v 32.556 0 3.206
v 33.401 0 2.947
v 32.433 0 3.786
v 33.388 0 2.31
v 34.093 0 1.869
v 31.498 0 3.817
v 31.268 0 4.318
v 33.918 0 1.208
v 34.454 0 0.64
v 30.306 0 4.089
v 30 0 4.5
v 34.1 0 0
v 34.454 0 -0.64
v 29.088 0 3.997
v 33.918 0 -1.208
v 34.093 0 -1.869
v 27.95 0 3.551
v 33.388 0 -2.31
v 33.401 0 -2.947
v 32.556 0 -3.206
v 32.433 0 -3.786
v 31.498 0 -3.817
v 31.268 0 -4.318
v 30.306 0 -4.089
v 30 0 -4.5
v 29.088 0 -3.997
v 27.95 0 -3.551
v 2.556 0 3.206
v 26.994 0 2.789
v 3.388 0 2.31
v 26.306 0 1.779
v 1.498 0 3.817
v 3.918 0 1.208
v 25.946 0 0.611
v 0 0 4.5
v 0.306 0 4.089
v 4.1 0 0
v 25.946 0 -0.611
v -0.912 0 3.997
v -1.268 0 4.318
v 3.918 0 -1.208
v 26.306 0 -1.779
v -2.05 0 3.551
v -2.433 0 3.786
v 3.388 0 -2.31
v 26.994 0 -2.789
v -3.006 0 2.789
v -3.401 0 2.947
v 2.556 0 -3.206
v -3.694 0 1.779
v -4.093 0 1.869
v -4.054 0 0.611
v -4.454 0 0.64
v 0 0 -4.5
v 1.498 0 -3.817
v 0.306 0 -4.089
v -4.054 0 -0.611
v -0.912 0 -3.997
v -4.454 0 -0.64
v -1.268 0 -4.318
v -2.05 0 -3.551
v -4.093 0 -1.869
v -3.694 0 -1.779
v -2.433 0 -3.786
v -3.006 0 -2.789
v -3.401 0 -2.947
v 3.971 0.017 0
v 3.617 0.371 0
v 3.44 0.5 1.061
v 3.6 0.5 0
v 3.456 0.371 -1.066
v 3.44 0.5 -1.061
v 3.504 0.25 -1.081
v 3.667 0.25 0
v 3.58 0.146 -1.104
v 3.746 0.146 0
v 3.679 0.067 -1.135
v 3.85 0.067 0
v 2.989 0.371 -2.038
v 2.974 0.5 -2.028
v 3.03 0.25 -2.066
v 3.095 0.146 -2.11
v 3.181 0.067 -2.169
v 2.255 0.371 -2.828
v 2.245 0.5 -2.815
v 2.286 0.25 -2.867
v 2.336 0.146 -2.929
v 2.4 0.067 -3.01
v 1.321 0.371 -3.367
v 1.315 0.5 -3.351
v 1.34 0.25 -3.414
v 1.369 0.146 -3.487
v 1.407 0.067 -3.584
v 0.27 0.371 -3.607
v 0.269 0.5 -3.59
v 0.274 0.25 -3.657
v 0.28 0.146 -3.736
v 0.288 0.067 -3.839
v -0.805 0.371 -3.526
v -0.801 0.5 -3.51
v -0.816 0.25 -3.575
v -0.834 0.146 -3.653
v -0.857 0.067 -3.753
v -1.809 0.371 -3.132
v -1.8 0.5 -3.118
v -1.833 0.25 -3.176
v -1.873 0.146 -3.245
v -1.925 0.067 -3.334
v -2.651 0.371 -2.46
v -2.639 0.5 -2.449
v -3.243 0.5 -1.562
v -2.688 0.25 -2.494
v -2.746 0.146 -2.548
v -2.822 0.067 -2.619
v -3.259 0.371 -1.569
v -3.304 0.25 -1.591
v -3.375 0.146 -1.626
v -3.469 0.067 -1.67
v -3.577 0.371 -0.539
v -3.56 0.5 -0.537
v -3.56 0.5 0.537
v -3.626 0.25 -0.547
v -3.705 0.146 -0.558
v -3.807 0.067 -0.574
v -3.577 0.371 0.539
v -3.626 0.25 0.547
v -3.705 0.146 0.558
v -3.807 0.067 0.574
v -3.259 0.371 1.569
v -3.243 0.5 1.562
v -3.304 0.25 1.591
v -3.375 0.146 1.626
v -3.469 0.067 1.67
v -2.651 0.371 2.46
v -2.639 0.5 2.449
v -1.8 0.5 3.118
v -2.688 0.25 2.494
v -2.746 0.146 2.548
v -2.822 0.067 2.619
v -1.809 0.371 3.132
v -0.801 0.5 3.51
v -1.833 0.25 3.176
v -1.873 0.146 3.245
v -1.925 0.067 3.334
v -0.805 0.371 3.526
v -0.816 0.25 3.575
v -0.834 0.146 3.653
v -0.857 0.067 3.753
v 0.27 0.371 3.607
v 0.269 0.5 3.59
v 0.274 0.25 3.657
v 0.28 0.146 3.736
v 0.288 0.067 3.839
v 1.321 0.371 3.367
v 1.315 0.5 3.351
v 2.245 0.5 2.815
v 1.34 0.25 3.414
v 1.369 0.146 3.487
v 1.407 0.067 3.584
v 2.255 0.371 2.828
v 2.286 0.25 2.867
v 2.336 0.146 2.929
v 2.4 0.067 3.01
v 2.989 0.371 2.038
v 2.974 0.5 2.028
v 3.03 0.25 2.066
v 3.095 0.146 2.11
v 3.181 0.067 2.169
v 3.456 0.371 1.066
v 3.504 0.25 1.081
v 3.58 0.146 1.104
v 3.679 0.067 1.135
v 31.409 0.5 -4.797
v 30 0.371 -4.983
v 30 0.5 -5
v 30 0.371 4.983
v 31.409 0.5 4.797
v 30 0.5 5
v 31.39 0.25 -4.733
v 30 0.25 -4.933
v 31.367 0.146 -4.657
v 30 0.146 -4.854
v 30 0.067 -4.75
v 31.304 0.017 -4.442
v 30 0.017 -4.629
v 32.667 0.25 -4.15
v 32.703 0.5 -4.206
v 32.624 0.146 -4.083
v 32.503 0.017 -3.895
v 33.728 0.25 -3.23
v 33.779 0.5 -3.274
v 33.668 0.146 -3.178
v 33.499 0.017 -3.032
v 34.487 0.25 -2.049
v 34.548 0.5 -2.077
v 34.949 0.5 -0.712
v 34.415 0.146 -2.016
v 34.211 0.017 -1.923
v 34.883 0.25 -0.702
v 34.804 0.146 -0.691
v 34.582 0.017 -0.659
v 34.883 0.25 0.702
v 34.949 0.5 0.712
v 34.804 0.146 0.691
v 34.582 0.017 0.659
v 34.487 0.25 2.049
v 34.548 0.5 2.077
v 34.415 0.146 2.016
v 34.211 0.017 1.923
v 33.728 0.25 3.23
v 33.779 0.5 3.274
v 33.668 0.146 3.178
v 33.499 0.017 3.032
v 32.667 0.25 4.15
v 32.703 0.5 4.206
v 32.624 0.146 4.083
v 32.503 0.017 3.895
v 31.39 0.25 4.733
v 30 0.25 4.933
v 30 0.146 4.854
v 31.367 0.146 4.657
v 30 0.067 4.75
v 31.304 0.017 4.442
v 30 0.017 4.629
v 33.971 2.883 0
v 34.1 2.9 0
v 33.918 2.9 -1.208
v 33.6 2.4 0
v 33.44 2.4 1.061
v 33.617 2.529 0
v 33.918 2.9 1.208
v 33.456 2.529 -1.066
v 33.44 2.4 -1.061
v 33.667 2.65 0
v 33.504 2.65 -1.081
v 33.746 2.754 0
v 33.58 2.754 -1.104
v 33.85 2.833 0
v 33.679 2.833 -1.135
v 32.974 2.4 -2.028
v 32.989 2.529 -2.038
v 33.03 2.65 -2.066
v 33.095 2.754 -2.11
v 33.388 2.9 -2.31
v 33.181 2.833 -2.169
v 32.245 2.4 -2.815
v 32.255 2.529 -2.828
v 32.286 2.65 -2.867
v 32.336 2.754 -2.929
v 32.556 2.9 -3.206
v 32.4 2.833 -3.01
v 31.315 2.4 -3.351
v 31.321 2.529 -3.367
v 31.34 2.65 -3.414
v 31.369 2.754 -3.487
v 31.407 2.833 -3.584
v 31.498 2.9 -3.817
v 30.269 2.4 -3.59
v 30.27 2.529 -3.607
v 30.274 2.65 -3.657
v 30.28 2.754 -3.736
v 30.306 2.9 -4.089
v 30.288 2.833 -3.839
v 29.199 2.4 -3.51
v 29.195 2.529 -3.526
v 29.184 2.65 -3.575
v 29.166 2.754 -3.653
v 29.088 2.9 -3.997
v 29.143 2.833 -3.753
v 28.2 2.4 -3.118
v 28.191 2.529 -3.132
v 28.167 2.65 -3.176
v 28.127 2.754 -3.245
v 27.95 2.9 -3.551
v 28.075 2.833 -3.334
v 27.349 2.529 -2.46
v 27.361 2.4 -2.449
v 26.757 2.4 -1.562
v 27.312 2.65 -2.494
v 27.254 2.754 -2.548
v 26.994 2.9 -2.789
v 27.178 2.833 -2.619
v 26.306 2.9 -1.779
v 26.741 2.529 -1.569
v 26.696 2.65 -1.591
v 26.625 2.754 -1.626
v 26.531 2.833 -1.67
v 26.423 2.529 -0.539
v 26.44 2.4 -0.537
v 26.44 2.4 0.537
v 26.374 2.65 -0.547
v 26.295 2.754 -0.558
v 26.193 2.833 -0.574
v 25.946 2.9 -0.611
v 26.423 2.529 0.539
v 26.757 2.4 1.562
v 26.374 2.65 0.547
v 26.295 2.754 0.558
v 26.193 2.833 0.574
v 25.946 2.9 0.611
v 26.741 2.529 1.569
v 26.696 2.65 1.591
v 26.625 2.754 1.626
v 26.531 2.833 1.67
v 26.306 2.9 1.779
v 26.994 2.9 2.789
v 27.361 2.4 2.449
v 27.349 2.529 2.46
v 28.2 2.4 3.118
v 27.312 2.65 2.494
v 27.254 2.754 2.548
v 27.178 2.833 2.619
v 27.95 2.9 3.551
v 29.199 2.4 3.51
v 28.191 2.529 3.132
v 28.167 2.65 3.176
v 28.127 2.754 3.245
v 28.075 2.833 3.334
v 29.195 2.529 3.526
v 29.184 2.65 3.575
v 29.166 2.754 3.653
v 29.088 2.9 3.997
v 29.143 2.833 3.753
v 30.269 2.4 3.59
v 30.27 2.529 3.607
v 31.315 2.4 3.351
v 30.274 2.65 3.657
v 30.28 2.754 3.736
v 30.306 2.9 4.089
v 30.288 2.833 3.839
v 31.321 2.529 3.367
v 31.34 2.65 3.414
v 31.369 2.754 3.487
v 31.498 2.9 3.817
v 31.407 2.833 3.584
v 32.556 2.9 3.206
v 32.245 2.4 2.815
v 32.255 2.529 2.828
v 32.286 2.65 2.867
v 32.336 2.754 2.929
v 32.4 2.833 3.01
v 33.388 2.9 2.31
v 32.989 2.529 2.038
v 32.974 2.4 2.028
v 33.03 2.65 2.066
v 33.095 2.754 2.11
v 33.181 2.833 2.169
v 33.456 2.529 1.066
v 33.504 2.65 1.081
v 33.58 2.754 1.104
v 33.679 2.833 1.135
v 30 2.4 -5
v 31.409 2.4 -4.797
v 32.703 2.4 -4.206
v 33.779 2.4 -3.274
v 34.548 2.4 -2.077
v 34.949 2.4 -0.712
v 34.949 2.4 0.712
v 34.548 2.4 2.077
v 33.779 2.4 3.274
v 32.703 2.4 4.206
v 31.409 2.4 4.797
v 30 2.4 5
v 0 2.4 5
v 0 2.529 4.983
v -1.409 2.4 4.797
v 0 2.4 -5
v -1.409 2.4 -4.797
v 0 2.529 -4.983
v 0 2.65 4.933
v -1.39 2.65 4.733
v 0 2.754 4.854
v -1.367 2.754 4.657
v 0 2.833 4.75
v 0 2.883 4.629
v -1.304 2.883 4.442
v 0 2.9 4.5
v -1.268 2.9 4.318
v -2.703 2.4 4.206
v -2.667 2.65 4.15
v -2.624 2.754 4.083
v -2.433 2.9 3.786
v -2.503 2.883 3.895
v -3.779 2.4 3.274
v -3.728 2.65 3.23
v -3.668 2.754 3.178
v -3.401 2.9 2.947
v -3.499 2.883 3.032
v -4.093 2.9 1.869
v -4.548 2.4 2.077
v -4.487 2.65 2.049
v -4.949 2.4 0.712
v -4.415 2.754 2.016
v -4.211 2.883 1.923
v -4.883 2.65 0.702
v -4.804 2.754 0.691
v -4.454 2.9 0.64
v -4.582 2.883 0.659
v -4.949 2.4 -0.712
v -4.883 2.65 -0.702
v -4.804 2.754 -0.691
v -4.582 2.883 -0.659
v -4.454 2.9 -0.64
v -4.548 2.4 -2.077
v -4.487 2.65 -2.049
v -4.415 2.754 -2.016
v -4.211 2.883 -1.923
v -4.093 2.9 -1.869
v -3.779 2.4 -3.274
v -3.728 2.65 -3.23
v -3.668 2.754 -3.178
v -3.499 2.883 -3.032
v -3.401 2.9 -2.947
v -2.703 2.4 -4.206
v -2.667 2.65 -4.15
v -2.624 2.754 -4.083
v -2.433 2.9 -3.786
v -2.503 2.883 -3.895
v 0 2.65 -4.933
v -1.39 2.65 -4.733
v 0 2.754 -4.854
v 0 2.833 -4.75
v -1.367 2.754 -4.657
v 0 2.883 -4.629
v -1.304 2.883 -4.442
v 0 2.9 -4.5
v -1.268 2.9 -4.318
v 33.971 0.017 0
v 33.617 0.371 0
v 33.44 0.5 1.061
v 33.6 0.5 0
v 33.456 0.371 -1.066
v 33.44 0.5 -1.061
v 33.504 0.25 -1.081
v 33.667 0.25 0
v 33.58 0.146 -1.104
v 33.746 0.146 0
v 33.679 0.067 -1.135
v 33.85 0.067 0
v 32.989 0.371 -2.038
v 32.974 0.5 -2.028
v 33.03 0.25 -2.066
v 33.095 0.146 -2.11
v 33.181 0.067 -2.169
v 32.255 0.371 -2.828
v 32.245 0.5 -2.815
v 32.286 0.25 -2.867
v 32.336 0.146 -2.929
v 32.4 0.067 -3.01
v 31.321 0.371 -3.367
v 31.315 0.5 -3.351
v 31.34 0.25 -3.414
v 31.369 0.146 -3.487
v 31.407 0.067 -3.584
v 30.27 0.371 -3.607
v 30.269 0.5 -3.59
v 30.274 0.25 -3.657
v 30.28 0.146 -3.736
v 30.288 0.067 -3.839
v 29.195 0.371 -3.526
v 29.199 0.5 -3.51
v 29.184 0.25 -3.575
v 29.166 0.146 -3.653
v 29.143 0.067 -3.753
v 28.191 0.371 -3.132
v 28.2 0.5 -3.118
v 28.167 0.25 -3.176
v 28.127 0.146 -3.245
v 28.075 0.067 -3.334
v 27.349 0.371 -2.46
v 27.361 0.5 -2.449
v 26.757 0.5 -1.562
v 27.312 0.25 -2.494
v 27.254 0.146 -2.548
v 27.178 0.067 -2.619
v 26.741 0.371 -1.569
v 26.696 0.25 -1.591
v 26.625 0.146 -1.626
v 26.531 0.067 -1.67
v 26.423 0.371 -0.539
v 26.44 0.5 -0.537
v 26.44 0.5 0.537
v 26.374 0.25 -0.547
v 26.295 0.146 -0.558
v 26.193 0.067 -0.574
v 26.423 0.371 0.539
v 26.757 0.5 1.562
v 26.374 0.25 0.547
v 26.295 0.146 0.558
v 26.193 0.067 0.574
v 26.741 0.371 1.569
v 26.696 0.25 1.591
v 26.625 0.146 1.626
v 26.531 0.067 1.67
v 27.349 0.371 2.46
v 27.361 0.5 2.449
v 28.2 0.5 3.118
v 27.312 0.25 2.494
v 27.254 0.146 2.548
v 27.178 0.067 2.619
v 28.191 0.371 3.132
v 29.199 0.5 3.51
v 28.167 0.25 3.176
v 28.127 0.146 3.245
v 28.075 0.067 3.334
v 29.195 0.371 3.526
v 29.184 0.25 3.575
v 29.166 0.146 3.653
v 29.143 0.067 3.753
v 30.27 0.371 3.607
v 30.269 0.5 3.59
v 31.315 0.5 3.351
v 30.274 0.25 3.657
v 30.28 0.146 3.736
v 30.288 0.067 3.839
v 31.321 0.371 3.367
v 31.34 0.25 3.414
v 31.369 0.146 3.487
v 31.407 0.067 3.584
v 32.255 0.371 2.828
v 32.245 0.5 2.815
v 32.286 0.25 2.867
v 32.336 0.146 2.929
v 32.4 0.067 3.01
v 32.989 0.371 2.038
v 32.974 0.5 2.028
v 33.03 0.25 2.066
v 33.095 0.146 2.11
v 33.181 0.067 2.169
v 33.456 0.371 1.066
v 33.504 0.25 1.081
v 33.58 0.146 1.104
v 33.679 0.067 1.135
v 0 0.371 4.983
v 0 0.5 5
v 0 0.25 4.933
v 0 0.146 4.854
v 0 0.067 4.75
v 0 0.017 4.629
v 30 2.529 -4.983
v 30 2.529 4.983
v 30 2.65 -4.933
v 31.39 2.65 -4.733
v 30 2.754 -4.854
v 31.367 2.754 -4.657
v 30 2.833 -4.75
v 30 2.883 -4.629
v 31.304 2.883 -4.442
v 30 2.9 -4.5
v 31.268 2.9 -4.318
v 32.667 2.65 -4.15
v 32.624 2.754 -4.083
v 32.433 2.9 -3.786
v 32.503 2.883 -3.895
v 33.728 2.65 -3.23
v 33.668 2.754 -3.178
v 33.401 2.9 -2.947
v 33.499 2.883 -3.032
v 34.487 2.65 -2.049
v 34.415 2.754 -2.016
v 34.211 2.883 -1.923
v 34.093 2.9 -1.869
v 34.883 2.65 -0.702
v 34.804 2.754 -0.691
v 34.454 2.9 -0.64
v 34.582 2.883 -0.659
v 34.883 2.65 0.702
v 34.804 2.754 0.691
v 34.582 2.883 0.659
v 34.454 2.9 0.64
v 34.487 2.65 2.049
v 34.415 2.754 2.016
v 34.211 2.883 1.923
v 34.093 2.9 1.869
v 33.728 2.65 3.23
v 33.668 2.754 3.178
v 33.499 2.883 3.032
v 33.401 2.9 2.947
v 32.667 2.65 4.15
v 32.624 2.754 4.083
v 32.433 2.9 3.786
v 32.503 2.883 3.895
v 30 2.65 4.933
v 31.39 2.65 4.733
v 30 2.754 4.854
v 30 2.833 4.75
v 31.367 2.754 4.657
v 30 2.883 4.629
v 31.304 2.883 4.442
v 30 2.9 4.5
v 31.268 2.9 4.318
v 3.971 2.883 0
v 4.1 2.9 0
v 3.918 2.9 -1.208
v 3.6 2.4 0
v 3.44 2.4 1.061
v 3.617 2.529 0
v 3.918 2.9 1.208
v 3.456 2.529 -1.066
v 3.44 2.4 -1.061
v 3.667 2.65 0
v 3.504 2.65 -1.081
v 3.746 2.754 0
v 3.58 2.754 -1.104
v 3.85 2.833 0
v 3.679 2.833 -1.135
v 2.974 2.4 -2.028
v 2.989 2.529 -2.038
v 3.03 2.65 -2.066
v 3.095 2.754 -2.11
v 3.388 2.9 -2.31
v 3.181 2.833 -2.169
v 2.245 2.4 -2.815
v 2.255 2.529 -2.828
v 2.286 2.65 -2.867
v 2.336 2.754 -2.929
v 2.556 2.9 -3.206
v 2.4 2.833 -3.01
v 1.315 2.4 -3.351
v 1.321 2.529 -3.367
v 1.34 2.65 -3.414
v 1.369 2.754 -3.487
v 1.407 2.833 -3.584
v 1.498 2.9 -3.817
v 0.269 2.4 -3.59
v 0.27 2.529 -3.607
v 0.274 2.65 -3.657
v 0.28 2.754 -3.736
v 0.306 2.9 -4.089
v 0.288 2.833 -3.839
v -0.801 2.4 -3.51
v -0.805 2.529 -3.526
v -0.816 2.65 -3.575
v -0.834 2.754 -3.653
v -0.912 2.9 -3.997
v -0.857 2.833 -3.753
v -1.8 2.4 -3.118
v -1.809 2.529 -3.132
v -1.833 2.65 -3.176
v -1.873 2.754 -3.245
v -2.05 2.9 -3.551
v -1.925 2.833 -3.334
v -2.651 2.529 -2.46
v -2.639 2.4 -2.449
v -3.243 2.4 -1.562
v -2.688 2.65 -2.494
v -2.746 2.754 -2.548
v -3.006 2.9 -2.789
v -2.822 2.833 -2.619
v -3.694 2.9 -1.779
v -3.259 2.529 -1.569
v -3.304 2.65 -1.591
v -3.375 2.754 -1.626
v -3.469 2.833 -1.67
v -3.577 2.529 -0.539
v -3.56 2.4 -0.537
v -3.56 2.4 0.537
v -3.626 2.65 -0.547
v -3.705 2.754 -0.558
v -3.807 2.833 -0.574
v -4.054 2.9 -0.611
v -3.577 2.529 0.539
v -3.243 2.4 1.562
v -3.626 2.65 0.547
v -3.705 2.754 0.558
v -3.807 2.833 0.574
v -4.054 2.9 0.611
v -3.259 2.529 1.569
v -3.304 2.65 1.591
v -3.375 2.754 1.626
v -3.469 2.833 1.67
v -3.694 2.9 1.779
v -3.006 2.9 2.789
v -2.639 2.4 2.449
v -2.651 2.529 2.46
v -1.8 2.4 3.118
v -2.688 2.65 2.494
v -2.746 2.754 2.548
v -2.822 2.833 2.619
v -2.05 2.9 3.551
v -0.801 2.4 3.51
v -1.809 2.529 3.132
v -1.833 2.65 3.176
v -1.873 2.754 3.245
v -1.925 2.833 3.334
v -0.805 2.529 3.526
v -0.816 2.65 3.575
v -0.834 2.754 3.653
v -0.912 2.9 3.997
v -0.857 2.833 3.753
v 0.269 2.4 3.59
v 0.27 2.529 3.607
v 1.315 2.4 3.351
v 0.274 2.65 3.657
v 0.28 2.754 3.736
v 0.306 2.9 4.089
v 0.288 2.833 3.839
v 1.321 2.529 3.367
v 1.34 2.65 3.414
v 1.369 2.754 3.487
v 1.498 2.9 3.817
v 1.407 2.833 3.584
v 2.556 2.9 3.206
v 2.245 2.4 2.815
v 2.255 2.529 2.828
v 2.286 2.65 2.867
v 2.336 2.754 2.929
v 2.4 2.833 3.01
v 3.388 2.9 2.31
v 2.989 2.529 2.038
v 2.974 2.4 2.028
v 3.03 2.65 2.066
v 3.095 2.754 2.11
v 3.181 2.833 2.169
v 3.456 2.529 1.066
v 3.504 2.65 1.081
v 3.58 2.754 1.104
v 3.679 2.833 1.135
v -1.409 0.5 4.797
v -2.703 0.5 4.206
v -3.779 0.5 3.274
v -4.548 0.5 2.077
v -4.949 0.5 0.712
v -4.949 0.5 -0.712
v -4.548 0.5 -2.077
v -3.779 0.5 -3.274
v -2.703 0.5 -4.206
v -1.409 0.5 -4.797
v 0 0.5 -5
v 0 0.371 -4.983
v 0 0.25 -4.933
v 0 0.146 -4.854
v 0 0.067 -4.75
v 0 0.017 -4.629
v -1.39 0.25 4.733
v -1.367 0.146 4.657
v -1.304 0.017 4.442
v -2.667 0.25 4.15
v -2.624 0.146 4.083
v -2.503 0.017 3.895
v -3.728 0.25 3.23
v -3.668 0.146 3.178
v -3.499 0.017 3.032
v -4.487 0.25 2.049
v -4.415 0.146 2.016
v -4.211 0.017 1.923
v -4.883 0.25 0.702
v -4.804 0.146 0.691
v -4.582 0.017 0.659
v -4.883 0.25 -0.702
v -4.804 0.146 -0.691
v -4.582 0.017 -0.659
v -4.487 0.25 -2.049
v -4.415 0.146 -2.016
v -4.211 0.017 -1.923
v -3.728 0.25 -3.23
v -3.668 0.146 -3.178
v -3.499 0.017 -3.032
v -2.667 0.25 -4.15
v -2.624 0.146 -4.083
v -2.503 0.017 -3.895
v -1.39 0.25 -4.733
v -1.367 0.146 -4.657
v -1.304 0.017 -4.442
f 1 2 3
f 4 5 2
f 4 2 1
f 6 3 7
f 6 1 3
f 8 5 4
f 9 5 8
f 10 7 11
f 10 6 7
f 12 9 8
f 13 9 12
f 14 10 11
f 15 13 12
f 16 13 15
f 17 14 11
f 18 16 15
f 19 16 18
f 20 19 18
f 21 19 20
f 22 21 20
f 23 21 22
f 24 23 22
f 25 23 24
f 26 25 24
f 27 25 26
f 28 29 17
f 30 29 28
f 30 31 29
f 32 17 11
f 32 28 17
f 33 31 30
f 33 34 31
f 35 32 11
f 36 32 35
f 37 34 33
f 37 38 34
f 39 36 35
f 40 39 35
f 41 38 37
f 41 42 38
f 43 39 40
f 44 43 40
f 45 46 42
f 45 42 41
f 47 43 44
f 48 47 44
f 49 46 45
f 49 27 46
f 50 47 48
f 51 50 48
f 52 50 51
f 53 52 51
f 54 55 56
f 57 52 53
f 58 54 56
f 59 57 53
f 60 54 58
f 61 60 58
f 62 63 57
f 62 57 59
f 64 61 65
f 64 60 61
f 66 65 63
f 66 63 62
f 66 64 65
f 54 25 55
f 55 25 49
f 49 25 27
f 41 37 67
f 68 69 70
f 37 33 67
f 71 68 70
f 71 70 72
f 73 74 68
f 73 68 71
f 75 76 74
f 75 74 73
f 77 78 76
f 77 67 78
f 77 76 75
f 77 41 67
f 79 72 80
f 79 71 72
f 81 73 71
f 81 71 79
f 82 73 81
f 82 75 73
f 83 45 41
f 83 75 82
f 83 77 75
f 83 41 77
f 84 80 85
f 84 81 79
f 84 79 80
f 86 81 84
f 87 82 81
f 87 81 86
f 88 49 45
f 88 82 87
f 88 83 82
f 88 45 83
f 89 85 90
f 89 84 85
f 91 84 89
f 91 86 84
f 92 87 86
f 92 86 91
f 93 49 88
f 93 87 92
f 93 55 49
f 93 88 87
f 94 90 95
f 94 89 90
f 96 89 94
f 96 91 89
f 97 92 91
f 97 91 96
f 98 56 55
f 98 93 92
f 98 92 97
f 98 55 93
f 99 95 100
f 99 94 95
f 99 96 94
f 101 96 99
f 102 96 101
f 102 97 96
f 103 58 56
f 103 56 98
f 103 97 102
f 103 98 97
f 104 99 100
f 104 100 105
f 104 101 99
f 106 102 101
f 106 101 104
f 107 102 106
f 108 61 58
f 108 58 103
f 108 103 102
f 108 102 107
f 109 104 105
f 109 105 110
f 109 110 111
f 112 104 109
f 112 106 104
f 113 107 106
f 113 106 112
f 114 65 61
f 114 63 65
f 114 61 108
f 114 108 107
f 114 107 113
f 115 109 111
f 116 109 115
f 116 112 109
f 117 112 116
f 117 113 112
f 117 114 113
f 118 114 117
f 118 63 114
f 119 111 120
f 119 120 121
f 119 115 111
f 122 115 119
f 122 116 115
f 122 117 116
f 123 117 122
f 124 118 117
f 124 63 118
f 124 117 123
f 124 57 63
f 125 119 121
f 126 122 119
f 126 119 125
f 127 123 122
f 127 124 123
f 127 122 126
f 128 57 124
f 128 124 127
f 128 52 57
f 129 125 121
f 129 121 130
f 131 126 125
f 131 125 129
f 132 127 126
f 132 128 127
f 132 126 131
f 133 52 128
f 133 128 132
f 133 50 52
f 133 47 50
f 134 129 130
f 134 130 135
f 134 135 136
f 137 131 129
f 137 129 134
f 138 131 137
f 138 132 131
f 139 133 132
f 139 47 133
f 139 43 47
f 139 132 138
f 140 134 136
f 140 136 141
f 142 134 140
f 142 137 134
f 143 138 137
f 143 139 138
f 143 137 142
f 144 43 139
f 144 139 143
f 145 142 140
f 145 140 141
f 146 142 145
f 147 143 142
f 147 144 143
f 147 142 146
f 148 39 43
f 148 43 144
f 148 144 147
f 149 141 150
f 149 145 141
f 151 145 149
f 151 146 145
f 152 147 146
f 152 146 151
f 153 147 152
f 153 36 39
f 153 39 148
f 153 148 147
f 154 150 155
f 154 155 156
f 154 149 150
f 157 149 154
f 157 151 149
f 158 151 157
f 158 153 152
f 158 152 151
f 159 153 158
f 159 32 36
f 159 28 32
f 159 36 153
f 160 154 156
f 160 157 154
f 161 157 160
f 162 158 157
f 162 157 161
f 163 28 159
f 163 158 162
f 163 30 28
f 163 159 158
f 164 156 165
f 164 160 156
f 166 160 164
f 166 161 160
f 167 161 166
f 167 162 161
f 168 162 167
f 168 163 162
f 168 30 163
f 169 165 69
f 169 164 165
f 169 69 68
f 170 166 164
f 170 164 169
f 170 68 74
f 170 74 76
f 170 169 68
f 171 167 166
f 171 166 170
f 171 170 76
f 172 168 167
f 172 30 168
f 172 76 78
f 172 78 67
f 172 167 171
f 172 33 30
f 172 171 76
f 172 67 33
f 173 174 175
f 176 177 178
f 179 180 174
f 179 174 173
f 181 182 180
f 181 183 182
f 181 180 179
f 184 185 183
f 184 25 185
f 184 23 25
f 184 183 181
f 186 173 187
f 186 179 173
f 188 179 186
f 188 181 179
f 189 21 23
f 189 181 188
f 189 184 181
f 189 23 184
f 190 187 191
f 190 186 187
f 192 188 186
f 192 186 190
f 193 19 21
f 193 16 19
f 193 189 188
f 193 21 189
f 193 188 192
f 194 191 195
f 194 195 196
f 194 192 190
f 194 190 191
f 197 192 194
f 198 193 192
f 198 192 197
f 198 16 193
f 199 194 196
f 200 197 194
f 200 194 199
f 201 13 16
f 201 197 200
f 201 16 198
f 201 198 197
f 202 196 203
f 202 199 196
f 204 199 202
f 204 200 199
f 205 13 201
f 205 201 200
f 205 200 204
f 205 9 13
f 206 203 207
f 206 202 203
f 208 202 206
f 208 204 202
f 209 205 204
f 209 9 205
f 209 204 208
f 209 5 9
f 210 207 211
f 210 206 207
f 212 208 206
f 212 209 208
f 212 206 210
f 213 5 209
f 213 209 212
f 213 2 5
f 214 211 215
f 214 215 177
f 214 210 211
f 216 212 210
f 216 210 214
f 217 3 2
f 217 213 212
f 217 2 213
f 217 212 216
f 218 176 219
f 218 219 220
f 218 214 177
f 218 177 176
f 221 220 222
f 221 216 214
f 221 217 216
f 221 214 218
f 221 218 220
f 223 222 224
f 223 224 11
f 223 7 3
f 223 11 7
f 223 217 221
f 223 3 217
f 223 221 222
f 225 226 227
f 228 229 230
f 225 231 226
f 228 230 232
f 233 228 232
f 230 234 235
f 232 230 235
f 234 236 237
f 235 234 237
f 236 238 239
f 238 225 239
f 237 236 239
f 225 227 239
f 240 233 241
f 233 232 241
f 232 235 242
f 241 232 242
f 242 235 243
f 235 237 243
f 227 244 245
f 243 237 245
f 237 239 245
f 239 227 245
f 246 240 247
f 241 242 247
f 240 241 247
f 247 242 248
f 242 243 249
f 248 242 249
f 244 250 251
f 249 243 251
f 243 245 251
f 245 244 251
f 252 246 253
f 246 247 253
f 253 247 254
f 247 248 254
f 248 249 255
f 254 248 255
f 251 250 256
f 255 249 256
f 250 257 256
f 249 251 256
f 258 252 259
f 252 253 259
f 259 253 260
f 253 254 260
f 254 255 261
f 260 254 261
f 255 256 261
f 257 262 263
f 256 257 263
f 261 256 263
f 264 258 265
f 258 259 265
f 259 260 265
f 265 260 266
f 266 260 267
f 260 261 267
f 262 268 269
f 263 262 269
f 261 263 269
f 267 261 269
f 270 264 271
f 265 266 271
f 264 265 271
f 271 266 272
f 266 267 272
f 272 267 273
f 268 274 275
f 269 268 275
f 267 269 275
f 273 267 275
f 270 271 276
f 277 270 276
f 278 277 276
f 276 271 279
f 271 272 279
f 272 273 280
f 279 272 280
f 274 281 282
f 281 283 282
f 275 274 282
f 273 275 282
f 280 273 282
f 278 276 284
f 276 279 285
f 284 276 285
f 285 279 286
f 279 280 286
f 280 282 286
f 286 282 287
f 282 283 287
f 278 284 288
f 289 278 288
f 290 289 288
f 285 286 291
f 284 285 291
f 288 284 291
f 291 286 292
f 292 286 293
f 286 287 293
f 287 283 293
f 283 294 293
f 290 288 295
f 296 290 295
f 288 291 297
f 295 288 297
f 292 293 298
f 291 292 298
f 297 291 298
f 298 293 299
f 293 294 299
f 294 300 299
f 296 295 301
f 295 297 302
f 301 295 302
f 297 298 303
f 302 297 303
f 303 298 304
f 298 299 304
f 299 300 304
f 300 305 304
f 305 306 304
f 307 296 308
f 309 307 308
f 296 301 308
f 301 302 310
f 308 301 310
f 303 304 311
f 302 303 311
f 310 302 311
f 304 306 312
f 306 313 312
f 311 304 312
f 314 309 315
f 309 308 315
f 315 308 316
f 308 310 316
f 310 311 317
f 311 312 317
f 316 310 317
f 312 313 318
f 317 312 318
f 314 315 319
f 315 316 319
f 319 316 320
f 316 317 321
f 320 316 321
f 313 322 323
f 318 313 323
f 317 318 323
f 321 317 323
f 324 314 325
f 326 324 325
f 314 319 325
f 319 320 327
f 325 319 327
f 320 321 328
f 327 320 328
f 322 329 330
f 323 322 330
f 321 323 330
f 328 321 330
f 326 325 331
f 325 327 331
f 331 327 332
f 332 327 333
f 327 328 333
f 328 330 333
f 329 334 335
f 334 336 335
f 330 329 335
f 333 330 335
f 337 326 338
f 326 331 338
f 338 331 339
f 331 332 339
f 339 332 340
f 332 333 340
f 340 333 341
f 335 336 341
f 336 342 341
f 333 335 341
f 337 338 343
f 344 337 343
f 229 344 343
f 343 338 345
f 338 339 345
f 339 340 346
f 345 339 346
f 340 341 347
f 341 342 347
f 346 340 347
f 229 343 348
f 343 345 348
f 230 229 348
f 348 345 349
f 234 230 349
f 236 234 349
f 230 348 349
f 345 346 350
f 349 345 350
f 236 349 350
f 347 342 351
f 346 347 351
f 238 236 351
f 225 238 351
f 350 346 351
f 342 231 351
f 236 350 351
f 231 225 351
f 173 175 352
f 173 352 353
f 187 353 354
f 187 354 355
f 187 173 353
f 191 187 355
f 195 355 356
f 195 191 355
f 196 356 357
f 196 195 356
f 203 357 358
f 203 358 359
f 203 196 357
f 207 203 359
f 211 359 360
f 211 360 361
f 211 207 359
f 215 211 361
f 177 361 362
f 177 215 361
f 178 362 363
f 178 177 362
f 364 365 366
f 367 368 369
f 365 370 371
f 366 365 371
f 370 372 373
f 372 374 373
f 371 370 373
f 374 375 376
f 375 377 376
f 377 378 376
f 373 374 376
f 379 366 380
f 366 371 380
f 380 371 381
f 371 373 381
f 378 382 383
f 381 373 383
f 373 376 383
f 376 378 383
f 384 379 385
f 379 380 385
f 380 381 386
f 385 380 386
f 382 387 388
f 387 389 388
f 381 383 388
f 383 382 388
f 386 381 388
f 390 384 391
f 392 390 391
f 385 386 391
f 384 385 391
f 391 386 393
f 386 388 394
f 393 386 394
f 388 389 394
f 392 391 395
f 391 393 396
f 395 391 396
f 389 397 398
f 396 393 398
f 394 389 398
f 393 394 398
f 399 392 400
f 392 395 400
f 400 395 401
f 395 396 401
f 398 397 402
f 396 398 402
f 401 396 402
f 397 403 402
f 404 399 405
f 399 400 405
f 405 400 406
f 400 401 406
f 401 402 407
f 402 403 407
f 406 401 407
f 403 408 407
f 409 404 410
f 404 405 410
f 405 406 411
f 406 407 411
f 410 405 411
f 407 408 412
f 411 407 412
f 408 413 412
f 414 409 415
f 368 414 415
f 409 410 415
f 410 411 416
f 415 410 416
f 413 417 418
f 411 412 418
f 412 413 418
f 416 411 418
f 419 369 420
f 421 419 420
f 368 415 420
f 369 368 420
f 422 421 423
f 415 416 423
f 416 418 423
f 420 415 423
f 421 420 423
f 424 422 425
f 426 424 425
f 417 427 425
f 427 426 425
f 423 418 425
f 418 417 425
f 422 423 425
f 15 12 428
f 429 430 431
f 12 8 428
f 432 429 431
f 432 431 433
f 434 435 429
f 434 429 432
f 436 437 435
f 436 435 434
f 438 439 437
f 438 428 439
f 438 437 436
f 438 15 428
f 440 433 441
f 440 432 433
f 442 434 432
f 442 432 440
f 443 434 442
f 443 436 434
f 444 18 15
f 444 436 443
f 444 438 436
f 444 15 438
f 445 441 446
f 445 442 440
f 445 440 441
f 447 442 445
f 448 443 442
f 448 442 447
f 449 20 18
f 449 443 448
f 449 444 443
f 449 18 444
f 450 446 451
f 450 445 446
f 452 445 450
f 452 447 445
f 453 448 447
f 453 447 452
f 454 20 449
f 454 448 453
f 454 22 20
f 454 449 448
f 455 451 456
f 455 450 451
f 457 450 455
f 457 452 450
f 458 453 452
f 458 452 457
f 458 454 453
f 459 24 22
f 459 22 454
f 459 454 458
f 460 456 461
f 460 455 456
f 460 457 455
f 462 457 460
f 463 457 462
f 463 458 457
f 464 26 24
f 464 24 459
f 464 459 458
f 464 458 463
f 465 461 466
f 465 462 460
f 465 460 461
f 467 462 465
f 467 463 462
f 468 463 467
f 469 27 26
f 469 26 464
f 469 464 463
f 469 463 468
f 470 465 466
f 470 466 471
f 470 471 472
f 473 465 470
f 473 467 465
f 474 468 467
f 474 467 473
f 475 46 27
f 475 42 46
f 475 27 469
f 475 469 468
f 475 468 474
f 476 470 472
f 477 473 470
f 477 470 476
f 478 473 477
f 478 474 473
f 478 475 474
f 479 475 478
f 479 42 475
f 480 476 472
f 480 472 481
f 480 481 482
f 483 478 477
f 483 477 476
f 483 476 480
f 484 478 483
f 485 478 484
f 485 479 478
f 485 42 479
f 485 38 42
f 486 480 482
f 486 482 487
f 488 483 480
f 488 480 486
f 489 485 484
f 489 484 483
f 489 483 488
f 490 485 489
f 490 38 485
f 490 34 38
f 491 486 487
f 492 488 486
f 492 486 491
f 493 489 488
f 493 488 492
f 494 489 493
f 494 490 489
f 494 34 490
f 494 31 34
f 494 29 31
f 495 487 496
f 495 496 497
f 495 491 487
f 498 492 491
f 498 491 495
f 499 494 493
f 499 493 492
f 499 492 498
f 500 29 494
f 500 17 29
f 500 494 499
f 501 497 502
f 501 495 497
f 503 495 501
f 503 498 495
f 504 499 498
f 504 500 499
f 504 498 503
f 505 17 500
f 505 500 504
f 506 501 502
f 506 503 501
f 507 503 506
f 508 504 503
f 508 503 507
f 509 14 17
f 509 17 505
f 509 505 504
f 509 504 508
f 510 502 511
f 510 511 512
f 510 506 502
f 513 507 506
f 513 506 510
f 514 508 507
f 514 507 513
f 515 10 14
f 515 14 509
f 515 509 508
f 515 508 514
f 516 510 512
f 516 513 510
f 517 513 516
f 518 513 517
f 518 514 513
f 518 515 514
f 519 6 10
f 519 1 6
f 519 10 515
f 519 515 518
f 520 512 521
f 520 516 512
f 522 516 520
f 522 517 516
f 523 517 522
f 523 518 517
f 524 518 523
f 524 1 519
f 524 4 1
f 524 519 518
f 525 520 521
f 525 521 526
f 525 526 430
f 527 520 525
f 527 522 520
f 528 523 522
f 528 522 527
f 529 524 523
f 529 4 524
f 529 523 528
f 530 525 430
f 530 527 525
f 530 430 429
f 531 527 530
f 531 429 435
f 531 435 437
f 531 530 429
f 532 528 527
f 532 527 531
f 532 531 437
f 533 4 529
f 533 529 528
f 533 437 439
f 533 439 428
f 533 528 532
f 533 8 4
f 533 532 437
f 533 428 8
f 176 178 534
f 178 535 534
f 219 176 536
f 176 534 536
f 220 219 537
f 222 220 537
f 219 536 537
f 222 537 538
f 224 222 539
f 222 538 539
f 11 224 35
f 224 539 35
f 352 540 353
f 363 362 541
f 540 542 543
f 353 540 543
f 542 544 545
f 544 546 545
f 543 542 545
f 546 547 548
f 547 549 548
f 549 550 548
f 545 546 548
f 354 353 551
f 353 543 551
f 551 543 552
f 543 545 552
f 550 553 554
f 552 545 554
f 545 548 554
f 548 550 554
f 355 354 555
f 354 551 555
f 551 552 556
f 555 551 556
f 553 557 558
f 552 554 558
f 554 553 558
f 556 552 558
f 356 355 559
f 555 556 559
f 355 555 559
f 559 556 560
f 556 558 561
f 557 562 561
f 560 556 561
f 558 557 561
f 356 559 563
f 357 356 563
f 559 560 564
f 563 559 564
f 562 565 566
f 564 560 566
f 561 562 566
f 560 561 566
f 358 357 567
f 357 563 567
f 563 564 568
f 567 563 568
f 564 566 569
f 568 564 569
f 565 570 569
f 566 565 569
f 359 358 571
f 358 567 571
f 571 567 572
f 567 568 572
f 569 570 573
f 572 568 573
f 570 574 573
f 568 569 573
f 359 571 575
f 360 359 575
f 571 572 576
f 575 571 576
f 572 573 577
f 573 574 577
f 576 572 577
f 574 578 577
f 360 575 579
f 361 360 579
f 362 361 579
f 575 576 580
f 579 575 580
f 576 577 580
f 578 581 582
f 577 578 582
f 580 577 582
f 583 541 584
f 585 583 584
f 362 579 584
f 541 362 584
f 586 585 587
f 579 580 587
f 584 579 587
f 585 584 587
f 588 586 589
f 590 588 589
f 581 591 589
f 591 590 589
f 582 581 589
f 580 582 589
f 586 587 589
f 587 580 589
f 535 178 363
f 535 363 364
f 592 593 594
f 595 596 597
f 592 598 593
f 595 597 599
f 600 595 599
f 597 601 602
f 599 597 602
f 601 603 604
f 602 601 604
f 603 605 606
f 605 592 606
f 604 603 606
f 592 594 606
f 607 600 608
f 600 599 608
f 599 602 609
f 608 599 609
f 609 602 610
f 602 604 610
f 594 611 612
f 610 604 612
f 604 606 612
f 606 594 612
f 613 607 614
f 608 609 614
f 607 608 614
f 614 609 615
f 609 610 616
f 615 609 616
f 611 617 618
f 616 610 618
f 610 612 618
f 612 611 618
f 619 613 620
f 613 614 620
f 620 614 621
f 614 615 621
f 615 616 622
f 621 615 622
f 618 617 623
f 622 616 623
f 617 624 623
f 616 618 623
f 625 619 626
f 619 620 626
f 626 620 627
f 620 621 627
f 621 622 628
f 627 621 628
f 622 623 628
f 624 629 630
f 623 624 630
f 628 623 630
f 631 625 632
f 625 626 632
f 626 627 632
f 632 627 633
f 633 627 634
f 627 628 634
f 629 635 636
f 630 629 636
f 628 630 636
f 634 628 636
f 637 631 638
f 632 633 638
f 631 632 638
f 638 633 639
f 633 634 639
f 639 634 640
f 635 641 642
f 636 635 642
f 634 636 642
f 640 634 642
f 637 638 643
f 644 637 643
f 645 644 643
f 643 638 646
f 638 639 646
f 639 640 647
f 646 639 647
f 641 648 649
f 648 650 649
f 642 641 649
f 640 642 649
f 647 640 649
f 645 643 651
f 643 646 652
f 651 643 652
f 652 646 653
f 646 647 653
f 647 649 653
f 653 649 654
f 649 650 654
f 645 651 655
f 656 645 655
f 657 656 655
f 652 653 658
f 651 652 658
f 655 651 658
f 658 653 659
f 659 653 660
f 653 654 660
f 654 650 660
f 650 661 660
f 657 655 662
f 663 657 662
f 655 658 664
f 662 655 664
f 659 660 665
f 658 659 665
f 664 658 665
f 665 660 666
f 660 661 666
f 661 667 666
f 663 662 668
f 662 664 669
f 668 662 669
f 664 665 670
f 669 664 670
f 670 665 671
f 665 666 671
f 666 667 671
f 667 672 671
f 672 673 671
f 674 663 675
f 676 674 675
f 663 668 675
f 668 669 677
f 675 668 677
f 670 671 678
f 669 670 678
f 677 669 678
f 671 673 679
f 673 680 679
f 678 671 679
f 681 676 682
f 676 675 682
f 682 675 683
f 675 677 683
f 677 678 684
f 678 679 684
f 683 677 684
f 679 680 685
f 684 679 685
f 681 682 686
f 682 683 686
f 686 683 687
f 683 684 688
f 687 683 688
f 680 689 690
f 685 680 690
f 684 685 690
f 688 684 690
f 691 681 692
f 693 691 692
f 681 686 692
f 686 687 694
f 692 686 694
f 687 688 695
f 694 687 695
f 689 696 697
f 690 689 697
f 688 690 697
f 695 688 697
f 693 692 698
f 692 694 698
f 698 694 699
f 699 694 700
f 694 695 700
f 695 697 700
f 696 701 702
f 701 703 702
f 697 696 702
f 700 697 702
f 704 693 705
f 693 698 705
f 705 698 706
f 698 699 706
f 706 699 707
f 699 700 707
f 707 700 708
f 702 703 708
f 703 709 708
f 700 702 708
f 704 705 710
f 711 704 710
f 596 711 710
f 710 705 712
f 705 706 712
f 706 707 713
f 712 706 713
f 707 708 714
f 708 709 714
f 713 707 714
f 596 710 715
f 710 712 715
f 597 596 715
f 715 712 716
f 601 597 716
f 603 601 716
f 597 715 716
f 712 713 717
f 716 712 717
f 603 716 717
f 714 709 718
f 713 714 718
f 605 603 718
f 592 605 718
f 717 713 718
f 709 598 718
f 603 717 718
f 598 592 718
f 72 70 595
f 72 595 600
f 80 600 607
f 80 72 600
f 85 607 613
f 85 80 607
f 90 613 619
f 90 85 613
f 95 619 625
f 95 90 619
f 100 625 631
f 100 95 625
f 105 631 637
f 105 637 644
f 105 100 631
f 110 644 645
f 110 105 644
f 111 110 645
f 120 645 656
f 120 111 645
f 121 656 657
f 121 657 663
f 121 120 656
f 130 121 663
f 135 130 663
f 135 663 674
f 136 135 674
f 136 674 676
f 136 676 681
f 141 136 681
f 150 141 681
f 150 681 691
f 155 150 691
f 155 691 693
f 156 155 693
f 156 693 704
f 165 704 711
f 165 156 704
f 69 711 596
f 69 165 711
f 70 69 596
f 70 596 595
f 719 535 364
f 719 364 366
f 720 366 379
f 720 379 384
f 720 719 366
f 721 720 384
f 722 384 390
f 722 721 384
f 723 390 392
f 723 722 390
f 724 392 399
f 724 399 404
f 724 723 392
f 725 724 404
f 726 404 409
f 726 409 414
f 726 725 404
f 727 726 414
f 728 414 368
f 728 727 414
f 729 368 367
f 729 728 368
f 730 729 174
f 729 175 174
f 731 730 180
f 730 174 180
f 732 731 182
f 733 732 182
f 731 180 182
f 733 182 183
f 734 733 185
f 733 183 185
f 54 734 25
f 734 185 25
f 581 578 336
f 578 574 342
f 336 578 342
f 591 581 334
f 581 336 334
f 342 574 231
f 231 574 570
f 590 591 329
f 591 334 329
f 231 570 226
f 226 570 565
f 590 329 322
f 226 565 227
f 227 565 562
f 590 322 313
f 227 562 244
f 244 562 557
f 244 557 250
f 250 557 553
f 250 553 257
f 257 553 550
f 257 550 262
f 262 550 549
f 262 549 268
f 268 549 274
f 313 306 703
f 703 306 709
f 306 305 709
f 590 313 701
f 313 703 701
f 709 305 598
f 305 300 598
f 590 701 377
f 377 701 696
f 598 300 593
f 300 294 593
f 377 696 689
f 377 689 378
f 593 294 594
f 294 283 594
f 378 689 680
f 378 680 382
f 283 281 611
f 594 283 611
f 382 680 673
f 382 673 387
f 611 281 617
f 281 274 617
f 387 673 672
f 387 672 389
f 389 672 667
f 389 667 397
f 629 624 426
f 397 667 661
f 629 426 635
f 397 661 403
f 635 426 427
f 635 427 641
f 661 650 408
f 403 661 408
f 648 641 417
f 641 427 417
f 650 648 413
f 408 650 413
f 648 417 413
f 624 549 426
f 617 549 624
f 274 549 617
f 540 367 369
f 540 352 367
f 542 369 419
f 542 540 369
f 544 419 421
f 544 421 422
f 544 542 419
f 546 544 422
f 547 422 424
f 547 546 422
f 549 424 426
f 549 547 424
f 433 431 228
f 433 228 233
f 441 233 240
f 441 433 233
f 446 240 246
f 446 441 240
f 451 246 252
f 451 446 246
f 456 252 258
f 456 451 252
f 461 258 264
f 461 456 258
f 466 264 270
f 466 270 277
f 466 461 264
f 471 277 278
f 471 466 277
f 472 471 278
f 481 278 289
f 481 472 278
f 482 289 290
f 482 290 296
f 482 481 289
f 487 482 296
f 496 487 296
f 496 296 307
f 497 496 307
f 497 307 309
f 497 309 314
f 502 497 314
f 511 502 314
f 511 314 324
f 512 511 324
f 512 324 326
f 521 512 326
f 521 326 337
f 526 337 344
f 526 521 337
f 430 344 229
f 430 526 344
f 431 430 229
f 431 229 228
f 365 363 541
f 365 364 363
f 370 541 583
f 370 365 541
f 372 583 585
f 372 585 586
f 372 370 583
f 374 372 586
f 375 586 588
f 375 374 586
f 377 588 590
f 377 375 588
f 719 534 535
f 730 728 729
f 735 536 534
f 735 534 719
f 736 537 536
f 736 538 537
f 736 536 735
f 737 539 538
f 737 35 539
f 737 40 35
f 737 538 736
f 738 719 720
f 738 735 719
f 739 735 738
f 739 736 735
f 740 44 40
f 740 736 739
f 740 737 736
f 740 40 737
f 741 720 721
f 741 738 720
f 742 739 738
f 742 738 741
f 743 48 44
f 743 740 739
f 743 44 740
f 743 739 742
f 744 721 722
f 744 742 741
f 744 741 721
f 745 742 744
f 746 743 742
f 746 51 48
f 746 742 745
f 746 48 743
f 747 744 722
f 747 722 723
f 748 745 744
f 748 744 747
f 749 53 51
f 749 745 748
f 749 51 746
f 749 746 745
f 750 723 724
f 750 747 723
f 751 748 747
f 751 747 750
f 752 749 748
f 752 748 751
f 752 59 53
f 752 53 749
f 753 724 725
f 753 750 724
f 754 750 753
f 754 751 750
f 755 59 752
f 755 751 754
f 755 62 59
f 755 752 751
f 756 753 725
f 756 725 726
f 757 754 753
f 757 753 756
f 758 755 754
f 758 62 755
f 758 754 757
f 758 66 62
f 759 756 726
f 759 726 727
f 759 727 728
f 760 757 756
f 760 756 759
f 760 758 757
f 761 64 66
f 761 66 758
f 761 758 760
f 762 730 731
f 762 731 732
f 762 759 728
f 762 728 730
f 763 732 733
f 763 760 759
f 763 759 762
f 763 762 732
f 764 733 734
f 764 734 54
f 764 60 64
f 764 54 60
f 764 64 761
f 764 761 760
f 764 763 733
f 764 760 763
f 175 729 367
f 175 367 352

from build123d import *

# Parameters (mm, degrees)
SKETCH1_R           = 3.6
BOSS_EXTRUDE1_DEPTH = 2.9
FILLET1_R           = 0.5


with BuildPart() as part:
    # Sketch1 → Boss-Extrude1 (new body)
    with BuildSketch(Plane(origin=(0, 0, 0), x_dir=(1, 0, 0), z_dir=(0, 1, 0))):
        with BuildLine():
            Line((0, 5), (30, 5))
            ThreePointArc((30, 5), (35, 0), (30, -5))
            Line((30, -5), (0, -5))
            ThreePointArc((0, -5), (-5, 0), (0, 5))
        make_face()
        Circle(SKETCH1_R, mode=Mode.SUBTRACT)
        with Locations((30, 0)):
            Circle(SKETCH1_R, mode=Mode.SUBTRACT)
    extrude(amount=BOSS_EXTRUDE1_DEPTH)

    # Fillet1
    fillet1_edges = [part.edges().sort_by_distance(p)[0] for p in [
        (35, 2.9, 0),
        (-3.6, 0, 0),
        (-3.6, 2.9, 0),
        (15, 2.9, -5),
        (26.4, 0, 0),
        (26.4, 2.9, 0),
        (-5, 2.9, 0),
        (15, 0, -5),
        (35, 0, 0),
        (15, 0, 5),
        (-5, 0, 0),
        (15, 2.9, 5),
    ]]
    fillet(fillet1_edges, radius=FILLET1_R)


solid = part.part
